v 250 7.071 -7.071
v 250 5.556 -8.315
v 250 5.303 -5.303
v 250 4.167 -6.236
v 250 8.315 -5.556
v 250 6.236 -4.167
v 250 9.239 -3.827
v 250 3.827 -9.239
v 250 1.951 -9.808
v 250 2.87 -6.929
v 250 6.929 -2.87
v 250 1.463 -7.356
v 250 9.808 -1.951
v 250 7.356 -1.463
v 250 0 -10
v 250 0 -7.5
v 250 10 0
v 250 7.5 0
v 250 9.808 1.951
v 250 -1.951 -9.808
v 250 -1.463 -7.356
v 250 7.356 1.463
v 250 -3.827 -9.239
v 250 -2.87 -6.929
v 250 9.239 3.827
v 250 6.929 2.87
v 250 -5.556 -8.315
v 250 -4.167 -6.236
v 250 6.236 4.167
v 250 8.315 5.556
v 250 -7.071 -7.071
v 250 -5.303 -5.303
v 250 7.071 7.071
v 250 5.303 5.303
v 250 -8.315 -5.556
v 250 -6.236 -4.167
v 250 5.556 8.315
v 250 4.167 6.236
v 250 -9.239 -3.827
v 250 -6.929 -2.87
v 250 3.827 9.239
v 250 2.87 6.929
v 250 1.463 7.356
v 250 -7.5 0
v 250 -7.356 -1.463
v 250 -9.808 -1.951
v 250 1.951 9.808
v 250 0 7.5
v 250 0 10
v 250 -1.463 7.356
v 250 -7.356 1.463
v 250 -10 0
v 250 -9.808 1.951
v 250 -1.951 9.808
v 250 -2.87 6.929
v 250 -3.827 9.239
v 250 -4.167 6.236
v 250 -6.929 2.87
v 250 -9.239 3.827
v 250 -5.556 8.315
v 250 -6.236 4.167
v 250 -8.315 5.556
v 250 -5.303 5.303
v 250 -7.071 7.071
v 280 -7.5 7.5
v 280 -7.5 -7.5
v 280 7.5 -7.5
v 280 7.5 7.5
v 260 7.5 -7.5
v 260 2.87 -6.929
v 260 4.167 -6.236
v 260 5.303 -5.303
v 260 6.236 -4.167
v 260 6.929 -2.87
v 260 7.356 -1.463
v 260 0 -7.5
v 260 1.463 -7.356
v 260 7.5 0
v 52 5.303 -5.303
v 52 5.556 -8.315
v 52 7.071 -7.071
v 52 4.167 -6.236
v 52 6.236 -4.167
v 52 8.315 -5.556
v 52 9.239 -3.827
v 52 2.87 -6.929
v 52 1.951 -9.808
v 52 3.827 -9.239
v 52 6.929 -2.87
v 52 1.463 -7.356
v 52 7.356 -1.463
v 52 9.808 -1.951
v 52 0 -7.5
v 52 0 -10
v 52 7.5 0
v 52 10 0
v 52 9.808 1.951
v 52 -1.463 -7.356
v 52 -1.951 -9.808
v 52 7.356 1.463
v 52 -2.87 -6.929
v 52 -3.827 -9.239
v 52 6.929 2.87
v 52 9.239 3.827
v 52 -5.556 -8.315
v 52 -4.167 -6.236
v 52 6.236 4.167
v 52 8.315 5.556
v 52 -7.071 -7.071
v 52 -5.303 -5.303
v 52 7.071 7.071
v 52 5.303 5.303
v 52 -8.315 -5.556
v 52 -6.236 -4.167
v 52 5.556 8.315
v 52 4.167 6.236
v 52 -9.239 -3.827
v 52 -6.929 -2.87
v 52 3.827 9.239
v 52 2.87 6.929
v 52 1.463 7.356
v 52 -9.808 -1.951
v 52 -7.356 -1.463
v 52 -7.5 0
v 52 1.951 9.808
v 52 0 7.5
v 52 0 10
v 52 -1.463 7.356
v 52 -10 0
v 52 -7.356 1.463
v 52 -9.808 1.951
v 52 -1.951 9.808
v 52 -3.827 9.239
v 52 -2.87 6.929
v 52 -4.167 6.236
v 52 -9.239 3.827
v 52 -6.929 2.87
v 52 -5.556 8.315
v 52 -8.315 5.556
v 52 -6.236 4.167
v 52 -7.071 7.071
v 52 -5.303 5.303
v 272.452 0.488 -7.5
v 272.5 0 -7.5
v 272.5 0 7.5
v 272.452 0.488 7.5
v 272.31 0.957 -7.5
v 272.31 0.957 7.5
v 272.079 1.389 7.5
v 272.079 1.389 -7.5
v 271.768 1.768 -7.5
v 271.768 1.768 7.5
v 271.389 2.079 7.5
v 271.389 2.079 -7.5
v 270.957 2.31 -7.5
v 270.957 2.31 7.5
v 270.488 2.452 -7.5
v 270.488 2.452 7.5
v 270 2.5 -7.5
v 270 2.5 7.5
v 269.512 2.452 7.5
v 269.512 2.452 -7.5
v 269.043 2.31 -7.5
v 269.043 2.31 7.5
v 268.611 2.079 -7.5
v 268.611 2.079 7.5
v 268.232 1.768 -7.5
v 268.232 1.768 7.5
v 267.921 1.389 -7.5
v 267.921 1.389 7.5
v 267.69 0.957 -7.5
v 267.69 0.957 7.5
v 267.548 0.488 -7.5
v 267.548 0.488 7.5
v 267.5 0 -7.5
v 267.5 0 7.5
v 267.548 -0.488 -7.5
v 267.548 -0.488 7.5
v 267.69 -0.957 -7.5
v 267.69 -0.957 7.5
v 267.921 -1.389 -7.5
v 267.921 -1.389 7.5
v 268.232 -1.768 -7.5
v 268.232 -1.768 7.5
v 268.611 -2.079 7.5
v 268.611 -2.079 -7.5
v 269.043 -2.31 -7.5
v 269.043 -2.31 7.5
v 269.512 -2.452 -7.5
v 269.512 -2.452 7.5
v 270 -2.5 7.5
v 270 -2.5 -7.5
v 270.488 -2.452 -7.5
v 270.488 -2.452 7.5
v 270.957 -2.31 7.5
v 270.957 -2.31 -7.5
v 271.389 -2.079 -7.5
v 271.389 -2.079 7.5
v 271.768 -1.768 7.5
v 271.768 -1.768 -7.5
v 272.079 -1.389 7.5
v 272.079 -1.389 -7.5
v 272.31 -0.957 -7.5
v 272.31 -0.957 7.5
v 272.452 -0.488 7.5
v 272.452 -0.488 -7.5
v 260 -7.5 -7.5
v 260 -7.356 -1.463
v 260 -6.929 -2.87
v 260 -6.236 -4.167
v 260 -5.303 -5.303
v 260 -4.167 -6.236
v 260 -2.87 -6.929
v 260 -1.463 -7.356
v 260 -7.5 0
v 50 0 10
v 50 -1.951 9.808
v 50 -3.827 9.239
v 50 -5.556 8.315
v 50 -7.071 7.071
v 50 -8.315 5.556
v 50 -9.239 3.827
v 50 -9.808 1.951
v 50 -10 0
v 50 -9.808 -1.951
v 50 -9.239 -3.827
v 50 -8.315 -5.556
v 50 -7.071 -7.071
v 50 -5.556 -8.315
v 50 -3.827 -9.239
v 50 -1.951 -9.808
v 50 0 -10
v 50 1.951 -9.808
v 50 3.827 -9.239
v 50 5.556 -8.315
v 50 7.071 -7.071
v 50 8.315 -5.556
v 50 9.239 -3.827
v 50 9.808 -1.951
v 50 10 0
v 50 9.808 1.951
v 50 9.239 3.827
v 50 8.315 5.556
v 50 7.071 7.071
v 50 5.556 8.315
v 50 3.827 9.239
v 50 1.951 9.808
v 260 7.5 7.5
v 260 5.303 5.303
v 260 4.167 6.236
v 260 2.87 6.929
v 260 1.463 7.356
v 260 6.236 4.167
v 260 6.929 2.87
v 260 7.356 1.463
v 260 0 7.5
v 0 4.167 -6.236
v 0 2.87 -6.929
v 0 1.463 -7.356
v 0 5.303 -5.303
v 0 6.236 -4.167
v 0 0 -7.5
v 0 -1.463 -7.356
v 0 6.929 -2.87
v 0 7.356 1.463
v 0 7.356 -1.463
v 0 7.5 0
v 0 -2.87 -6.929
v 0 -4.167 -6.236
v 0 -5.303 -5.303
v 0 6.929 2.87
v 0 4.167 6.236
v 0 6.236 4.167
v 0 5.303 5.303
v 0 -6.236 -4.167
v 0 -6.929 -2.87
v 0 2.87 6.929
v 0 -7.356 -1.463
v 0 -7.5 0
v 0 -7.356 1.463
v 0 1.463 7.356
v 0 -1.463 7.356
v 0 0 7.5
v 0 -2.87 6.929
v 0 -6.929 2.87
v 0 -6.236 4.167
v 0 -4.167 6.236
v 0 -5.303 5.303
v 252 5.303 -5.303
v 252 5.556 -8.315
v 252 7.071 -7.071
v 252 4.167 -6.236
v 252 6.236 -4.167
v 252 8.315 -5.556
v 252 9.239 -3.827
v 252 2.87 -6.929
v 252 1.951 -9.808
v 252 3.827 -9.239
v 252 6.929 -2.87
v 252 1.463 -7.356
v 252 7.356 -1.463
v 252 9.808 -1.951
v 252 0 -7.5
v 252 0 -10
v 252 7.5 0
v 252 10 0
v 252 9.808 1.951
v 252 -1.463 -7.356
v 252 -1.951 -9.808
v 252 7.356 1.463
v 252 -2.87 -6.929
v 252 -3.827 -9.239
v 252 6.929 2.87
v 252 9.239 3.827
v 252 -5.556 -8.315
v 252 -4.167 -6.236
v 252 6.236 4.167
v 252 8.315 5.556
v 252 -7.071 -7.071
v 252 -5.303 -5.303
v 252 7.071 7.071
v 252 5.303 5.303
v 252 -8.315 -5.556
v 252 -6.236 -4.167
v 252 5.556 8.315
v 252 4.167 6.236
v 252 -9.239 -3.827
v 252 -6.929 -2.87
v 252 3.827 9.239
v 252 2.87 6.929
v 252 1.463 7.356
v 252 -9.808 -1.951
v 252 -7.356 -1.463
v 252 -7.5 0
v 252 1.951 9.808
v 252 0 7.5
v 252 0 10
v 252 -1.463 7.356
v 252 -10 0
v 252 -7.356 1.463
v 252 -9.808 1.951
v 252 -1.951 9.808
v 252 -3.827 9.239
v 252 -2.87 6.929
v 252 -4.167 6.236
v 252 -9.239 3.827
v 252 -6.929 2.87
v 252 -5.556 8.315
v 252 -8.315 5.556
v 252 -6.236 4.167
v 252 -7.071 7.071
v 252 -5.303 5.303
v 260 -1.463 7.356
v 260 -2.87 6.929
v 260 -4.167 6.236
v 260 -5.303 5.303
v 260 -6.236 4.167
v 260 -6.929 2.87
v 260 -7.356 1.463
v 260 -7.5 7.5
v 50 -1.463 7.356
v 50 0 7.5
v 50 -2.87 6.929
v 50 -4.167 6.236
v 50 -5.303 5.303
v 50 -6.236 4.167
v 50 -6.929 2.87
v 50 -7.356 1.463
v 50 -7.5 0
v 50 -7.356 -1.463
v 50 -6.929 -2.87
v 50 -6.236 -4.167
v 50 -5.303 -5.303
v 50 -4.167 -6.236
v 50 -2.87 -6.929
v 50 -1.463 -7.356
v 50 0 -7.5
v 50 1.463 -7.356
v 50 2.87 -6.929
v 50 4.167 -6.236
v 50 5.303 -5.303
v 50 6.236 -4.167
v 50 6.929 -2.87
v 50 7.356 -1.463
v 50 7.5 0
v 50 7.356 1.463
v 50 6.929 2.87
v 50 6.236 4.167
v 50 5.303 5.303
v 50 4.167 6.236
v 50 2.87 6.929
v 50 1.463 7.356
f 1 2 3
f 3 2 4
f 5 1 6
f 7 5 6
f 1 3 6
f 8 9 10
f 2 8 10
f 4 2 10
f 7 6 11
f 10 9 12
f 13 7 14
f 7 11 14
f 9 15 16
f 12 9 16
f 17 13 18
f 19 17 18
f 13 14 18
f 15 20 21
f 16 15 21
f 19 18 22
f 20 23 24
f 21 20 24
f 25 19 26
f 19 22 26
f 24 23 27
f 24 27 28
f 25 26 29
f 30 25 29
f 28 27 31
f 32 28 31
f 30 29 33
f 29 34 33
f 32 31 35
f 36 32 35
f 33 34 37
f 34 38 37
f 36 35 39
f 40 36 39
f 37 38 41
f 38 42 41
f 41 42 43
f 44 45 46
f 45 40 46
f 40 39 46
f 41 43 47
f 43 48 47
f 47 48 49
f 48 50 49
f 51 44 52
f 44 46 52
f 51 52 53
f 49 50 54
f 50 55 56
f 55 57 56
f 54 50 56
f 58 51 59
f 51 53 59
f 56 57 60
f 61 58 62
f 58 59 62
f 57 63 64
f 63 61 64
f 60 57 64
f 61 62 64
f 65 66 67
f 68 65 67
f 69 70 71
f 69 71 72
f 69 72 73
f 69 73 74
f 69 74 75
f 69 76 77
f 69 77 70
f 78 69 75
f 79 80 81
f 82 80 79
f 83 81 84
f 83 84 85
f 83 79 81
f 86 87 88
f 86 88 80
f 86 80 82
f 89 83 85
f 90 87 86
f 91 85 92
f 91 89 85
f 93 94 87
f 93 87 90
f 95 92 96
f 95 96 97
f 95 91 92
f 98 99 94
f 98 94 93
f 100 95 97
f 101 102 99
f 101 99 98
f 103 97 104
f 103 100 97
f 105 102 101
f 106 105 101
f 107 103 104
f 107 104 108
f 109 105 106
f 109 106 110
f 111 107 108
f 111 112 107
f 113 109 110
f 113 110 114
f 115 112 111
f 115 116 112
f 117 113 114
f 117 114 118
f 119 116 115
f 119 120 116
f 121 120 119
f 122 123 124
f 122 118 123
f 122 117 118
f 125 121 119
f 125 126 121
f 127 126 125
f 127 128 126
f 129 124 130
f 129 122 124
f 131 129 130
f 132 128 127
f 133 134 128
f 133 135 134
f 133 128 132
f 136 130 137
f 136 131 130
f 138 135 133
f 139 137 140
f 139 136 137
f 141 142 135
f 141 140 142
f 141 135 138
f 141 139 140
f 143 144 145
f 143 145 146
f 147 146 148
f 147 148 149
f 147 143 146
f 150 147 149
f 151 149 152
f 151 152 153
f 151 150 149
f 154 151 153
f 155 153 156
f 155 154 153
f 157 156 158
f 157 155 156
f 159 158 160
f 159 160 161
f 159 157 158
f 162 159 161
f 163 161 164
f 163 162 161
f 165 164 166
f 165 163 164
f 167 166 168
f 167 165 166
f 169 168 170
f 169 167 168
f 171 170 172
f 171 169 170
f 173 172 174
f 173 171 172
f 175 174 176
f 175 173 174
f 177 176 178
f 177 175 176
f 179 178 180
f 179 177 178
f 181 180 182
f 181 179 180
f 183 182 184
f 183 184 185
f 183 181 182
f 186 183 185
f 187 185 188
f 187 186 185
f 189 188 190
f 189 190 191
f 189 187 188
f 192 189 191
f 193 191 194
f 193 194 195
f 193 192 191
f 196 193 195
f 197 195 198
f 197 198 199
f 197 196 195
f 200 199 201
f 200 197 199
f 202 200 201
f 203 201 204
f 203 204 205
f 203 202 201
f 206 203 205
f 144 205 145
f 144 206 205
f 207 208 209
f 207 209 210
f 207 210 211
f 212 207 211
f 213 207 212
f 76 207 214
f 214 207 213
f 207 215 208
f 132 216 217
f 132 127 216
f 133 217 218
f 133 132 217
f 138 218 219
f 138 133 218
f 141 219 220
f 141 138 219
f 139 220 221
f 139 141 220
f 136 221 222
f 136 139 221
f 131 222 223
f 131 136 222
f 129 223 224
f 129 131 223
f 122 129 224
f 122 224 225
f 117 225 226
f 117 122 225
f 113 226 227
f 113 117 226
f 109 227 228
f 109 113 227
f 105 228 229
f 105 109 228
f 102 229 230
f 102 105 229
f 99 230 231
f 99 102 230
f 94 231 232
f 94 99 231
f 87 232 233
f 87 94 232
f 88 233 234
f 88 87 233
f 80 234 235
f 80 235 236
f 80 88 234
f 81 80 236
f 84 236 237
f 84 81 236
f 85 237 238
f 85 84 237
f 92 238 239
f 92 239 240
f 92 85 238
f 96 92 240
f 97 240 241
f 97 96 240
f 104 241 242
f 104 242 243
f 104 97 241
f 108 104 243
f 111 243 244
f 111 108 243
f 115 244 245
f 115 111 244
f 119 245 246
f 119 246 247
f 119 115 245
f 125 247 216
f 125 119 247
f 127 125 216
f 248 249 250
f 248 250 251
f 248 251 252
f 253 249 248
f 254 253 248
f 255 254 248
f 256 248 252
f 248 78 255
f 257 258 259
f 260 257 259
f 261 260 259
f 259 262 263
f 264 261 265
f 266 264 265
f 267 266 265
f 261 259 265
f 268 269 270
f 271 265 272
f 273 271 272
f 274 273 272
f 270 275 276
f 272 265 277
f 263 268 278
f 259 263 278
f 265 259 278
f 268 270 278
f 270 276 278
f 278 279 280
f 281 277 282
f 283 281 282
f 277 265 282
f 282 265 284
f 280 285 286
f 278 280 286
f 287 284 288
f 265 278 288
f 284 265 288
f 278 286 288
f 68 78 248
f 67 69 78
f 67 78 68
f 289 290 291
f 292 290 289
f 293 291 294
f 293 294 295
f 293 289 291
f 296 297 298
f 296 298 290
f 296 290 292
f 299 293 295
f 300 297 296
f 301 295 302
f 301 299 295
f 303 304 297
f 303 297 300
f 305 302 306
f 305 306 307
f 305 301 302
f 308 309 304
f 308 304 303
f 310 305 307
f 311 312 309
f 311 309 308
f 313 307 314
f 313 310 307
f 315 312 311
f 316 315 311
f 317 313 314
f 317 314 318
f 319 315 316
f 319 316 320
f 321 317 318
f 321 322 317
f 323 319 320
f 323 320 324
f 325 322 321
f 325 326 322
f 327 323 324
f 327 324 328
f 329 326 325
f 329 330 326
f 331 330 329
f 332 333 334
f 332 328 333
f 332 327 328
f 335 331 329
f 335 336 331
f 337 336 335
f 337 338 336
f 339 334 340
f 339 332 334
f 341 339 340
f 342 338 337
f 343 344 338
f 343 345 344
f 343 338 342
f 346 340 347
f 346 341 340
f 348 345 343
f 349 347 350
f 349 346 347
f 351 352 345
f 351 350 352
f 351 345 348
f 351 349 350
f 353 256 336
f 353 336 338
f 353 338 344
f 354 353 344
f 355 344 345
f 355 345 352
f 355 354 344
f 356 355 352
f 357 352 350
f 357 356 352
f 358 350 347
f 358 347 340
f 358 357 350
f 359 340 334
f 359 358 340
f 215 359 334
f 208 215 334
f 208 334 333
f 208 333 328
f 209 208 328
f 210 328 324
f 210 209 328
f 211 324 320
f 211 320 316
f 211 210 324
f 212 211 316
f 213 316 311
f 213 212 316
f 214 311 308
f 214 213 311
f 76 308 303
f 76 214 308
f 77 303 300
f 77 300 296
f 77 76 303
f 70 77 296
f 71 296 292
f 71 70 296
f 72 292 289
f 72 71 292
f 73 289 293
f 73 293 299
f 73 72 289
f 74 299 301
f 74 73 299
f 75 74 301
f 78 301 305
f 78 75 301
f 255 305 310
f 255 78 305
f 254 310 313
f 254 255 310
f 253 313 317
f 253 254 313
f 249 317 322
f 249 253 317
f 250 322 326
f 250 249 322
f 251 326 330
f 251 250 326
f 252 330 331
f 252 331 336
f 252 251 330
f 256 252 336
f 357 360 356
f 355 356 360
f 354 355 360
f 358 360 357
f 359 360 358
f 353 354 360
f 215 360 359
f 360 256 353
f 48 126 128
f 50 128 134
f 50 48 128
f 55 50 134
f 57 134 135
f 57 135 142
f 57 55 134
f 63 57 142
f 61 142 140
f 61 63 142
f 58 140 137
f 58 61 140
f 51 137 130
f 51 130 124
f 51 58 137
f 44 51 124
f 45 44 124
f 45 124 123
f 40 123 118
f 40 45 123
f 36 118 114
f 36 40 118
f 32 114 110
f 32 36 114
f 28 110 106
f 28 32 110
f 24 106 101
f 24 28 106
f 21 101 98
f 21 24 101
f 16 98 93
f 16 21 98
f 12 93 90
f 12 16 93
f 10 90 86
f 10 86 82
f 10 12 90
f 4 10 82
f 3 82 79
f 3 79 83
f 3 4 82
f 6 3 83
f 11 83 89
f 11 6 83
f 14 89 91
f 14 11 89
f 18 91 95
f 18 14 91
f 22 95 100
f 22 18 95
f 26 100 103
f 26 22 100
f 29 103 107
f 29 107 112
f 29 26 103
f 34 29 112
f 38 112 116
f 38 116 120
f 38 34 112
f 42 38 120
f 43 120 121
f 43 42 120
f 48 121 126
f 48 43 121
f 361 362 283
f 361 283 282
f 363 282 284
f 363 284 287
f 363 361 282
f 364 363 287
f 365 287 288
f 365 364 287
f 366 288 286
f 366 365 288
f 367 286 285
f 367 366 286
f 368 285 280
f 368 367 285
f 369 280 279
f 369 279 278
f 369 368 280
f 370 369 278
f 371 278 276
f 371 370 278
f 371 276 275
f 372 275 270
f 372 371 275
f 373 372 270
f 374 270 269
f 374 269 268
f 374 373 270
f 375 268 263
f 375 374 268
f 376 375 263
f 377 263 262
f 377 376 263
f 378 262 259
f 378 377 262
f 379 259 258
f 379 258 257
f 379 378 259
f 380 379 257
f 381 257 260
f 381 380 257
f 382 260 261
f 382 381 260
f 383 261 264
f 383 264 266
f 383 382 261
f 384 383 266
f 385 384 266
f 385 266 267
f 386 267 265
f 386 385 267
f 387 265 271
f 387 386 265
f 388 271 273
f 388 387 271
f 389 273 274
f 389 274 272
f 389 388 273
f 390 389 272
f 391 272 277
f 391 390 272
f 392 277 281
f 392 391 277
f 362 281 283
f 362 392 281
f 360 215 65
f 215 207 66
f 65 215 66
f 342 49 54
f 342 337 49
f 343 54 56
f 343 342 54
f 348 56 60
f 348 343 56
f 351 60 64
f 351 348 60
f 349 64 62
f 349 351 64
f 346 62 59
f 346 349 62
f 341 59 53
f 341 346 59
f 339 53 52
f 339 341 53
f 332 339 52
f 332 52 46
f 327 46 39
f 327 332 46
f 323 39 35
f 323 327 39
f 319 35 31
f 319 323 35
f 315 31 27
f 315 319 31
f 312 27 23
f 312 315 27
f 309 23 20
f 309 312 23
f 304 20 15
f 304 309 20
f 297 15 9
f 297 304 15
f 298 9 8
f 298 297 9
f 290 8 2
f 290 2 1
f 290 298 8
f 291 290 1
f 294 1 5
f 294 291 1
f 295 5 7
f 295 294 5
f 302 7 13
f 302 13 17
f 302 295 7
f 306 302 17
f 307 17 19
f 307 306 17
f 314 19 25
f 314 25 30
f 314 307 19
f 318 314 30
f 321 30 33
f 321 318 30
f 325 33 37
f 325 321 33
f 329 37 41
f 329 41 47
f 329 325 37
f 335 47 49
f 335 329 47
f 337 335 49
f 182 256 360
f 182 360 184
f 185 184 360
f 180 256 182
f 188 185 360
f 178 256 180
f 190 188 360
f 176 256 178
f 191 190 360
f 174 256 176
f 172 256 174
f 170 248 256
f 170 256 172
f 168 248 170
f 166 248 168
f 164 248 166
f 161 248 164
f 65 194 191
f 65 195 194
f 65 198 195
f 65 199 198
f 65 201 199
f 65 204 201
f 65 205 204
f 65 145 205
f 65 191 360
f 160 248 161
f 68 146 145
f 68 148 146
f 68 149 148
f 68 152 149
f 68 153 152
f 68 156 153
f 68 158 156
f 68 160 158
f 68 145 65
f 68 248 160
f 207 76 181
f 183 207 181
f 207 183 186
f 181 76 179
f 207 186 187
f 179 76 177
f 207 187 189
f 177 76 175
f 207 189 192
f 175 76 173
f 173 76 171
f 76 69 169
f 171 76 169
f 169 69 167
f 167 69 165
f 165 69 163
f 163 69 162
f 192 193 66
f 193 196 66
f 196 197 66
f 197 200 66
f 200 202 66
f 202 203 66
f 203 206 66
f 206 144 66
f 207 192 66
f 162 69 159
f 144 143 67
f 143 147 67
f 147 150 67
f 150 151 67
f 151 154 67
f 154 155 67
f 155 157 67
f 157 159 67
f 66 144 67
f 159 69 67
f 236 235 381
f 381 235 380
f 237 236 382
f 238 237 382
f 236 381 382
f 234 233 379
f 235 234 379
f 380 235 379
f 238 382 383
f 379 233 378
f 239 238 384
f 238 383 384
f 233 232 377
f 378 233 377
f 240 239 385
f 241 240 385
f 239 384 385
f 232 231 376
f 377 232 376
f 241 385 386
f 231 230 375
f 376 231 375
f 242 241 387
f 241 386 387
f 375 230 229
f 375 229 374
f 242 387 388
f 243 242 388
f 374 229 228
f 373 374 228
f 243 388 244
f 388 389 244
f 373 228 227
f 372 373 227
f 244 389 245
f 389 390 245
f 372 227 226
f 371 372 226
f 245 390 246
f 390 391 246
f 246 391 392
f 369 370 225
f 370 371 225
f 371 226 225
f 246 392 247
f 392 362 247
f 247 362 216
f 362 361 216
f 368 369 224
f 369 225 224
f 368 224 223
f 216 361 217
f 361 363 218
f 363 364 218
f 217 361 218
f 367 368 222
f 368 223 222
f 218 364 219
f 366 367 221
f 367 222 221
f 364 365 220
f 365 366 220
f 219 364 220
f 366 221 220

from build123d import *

# Parameters (mm, degrees)
ESBO_O1_W                     = 280
ESBO_O1_H                     = 7.5
ESBO_O3_W                     = 2
ESBO_O3_H                     = 10
RESSALTO_EXTRUS_O1_DEPTH      = 7.5
RESSALTO_EXTRUS_O1_DEPTH_BACK = 7.5
ESBO_O4_W                     = 20
ESBO_O4_H                     = 15
CORTE_EXTRUS_O1_DEPTH         = 7.5
CORTE_EXTRUS_O1_DEPTH_BACK    = 7.5
ESBO_O2_R                     = 2.5


with BuildPart() as part:
    # Esboço1 → Revolução1 (revolve)
    with BuildSketch(Plane.XY):
        with Locations((140, -3.75)):
            Rectangle(ESBO_O1_W, ESBO_O1_H)
    revolve(axis=Axis((0, 0, 0), (1, 0, 0)))

    # Esboço3 → Revolução2 (revolve)
    with BuildSketch(Plane.XY):
        with Locations((251, -5)):
            Rectangle(ESBO_O3_W, ESBO_O3_H)
        with Locations((51, -5)):
            Rectangle(ESBO_O3_W, ESBO_O3_H)
    revolve(axis=Axis((50, 0, 0), (1, 0, 0)))

    # Esboço4 → Ressalto-extrusão1 (add, two sides: drawn at the far end of the back side and taken through both)
    with BuildSketch(Plane.XY.offset(-RESSALTO_EXTRUS_O1_DEPTH_BACK)):
        with Locations((270, 0)):
            Rectangle(ESBO_O4_W, ESBO_O4_H)
    extrude(amount=RESSALTO_EXTRUS_O1_DEPTH + RESSALTO_EXTRUS_O1_DEPTH_BACK)

    # Esboço2 → Corte-extrusão1 (cut, two sides: drawn at the far end of the back side and taken through both)
    with BuildSketch(Plane.XY.offset(-CORTE_EXTRUS_O1_DEPTH_BACK)):
        with Locations((270, 0)):
            Circle(ESBO_O2_R)
    extrude(amount=CORTE_EXTRUS_O1_DEPTH + CORTE_EXTRUS_O1_DEPTH_BACK, mode=Mode.SUBTRACT)


solid = part.part
